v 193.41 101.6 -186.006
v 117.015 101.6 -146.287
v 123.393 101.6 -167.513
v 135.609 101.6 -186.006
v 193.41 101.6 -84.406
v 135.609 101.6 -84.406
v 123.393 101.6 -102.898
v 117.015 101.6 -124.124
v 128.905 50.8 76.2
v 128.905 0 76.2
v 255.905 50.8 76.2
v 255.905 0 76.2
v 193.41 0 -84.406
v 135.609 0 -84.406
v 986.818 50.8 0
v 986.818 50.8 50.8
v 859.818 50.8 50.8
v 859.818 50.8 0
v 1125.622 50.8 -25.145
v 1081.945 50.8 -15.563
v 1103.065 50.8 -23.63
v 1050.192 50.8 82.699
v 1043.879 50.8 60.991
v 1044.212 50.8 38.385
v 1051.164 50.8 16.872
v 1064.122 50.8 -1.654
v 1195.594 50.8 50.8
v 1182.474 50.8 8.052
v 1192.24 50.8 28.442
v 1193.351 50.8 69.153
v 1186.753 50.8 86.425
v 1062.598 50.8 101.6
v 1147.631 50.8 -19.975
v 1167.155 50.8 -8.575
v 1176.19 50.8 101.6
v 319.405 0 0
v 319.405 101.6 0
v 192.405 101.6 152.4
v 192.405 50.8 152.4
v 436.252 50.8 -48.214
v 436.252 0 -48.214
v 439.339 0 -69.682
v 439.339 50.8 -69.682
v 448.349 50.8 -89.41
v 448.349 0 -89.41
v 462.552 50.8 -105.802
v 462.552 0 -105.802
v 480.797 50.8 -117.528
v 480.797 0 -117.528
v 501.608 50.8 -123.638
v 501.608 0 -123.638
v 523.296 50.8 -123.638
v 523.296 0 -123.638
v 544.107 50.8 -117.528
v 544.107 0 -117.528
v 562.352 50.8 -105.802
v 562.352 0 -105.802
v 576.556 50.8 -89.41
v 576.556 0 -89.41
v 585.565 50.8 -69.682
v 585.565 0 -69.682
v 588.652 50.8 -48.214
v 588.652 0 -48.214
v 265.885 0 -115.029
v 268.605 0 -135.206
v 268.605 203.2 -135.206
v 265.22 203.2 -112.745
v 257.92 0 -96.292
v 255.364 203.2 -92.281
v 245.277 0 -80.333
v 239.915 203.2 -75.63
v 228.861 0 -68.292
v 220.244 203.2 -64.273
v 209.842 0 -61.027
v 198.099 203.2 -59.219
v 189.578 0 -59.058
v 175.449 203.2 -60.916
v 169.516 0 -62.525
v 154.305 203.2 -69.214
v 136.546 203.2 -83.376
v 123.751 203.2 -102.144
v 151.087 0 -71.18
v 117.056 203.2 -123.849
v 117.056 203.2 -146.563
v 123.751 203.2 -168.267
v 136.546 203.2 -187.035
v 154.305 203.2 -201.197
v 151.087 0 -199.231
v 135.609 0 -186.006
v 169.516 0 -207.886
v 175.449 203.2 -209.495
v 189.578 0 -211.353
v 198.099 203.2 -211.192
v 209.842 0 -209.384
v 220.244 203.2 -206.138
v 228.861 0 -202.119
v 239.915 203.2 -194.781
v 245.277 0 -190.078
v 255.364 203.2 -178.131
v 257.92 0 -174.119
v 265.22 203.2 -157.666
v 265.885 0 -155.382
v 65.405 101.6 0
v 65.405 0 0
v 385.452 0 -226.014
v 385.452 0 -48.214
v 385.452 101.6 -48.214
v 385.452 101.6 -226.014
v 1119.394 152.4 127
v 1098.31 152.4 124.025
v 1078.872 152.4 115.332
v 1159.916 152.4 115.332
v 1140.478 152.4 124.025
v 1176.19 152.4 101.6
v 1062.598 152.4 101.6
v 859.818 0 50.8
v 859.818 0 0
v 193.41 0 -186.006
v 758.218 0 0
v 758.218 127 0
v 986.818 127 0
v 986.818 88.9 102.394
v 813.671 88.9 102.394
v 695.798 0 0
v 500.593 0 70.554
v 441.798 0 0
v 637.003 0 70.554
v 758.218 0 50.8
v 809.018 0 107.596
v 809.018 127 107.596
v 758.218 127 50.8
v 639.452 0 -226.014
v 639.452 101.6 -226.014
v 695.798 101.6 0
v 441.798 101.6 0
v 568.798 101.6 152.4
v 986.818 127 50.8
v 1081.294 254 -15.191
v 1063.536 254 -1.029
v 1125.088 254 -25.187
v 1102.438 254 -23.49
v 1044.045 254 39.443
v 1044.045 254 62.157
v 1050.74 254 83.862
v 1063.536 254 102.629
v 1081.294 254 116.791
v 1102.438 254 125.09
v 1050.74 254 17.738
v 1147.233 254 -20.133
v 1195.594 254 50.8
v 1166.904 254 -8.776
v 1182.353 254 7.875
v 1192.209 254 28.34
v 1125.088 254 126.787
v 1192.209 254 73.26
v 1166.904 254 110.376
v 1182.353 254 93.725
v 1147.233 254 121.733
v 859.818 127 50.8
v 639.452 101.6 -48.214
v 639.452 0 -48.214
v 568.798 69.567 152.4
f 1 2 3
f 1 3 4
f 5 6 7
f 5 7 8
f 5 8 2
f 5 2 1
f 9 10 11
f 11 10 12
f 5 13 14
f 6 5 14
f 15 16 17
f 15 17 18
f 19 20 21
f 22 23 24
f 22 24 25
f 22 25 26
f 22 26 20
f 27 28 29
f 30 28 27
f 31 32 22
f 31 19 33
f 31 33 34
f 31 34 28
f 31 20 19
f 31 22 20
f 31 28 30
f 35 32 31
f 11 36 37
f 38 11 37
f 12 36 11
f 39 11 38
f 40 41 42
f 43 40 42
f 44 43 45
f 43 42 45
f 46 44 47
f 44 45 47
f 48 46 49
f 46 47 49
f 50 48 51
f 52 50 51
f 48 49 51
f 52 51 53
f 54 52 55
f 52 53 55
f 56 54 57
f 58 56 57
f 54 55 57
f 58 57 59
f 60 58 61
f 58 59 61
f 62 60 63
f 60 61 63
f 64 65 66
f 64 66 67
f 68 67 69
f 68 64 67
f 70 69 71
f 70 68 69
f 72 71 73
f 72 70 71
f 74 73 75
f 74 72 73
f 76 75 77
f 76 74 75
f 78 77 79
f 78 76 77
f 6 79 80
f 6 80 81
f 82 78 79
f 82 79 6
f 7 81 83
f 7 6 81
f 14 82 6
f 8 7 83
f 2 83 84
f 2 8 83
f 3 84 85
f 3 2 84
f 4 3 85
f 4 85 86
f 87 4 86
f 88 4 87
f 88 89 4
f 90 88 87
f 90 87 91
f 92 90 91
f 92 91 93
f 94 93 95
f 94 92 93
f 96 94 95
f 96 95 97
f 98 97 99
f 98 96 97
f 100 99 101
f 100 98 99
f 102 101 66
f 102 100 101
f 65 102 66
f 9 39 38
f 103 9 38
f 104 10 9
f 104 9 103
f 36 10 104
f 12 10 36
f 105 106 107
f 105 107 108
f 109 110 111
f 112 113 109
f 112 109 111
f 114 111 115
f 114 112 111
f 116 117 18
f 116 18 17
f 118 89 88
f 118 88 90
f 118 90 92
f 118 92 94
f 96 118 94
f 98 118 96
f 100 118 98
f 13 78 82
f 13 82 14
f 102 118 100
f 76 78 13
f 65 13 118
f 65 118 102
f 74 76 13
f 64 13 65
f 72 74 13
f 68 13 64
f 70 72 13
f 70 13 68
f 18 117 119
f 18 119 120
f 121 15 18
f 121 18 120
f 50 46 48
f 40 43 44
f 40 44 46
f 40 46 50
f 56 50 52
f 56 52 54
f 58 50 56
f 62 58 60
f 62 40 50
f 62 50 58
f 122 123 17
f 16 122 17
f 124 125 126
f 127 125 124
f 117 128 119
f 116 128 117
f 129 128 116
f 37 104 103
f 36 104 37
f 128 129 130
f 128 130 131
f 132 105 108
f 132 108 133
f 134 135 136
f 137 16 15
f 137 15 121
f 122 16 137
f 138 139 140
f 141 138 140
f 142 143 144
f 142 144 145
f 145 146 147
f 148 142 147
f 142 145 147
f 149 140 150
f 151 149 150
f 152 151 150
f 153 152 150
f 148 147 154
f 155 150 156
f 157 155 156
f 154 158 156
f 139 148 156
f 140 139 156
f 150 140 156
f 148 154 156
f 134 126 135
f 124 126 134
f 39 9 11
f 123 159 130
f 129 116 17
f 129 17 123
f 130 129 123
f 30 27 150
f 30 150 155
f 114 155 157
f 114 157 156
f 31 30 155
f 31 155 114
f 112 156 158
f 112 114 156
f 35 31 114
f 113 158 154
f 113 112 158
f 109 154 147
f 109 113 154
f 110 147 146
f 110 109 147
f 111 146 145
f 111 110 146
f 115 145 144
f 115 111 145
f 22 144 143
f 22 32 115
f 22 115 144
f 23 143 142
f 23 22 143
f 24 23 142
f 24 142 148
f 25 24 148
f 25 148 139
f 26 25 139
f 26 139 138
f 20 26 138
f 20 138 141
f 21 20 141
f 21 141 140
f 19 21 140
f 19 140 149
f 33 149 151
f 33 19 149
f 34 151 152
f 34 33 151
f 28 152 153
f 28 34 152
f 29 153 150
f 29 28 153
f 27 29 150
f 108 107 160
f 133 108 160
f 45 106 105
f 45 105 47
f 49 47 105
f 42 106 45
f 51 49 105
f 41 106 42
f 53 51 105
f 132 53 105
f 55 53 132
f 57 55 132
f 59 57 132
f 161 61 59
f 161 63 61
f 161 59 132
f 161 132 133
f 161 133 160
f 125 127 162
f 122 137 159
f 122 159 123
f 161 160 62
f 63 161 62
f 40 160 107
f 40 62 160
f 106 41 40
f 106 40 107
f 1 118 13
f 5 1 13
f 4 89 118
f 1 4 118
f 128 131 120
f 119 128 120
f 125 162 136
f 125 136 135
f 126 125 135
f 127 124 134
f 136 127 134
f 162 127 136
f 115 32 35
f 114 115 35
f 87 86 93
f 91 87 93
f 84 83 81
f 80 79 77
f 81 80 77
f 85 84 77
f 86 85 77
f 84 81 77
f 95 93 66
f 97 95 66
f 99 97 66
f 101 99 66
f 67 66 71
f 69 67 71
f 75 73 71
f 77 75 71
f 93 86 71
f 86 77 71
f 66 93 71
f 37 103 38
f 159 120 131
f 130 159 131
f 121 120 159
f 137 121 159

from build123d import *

# Parameters (mm, degrees)
F1_DEPTH      = 101.6
F3_DEPTH      = 50.8
F5_DEPTH      = 101.6
F9_DEPTH      = 139.7
F9_DEPTH_BACK = 181.864
F11_DEPTH     = 127
F14_DEPTH     = 175.26
F15_R         = 76.2
F16_DEPTH     = 203.2
F18_DEPTH     = 101.6
F19_R         = 76.2
F20_DEPTH     = 203.2
F22_DEPTH     = 101.6
F24_DEPTH     = 101.6
F26_DEPTH     = 50.8


with BuildPart() as f1:
    # F0 (on Front) → F1 (new body)
    with BuildSketch(Plane.XZ):
        Polygon((192.4050192833, 152.4), (65.4050192833, 0), (319.4050192833, 0), align=None)
    extrude(amount=-F1_DEPTH)

    # F2 (on face) → F3 (cut)
    with BuildSketch(Plane.XZ):
        Polygon((192.4050192833, 152.4), (128.9050192833, 76.2), (255.9050192833, 76.2), align=None)
    extrude(amount=-F3_DEPTH, mode=Mode.SUBTRACT)


with BuildPart() as f5:
    # F4 (on face) → F5 (new body)
    with BuildSketch(Plane.XZ):
        Polygon((568.7983591557, 152.4), (441.7983591557, 0), (695.7983591557, 0), align=None)
    extrude(amount=-F5_DEPTH)

    # F8 (on 3pt) → F9 (cut, two sides)
    with BuildSketch(Plane.YZ.offset(568.7983591557)) as f9_sk:
        Polygon((0, 152.4), (0, 70.5539137125), (69.5669651031, 152.4), align=None)
    extrude(amount=-F9_DEPTH, mode=Mode.SUBTRACT)
    extrude(f9_sk.sketch, amount=F9_DEPTH_BACK, mode=Mode.SUBTRACT)


with BuildPart() as f11:
    # F10 (on face) → F11 (new body)
    with BuildSketch(Plane.XZ):
        Polygon((758.2182611698, 50.8), (758.2182611698, 0), (859.8182611698, 0), (859.8182611698, 50.8), (814.381359867, 101.6), (809.0182611698, 107.5961266285), align=None)
    extrude(amount=-F11_DEPTH)

    # F13 (on offset) → F14 (join)
    with BuildSketch(Plane.YZ.offset(986.8182611698)):
        Polygon((50.8, 50.8), (50.8, 0), (127, 0), (127, 50.8), (88.9, 102.3936793208), align=None)
    extrude(amount=-F14_DEPTH)


with BuildPart() as f16:
    # F15 (on face) → F16 (new body)
    with BuildSketch(Plane.XZ.offset(-50.8)):
        with Locations((1119.3940639496, 50.8)):
            Circle(F15_R)
    extrude(amount=-F16_DEPTH)

    # F17 (on face) → F18 (cut)
    with BuildSketch(Plane.XZ.offset(-50.8)):
        with BuildLine():
            ThreePointArc((1176.1901905781, 101.6), (1119.3940639496, 127), (1062.5979373211, 101.6))
            Line((1062.5979373211, 101.6), (1176.1901905781, 101.6))
        make_face()
    extrude(amount=-F18_DEPTH, mode=Mode.SUBTRACT)


with BuildPart() as f20:
    # F19 (on face) → F20 (new body)
    with BuildSketch(Plane.XZ):
        with Locations((192.4050192833, -135.2055221796)):
            Circle(F19_R)
    extrude(amount=-F20_DEPTH)

    # F21 (on face) → F22 (cut)
    with BuildSketch(Plane.XZ):
        with BuildLine():
            Line((193.4100860932, -84.4055221796), (135.6088926548, -84.4055221796))
            ThreePointArc((135.6088926548, -84.4055221796), (116.2050192833, -135.2055221796), (135.6088926548, -186.0055221796))
            Line((135.6088926548, -186.0055221796), (193.4100860932, -186.0055221796))
            Line((193.4100860932, -186.0055221796), (193.4100860932, -84.4055221796))
        make_face()
    extrude(amount=-F22_DEPTH, mode=Mode.SUBTRACT)


with BuildPart() as f24:
    # F23 (on face) → F24 (new body)
    with BuildSketch(Plane.XZ):
        Polygon((385.4520320892, -48.2135859251), (385.4520320892, -226.0135859251), (639.4520320892, -226.0135859251), (639.4520320892, -48.2135859251), (588.6520320892, -48.2135859251), (436.2520320892, -48.2135859251), align=None)
    extrude(amount=-F24_DEPTH)

    # F25 (on face) → F26 (cut)
    with BuildSketch(Plane.XZ):
        with BuildLine():
            Line((588.6520320892, -48.2135859251), (436.2520320892, -48.2135859251))
            ThreePointArc((436.2520320892, -48.2135859251), (512.4520320892, -124.4135859251), (588.6520320892, -48.2135859251))
        make_face()
    extrude(amount=-F26_DEPTH, mode=Mode.SUBTRACT)


solid = Compound([f1.part, f5.part, f11.part, f16.part, f20.part, f24.part])
